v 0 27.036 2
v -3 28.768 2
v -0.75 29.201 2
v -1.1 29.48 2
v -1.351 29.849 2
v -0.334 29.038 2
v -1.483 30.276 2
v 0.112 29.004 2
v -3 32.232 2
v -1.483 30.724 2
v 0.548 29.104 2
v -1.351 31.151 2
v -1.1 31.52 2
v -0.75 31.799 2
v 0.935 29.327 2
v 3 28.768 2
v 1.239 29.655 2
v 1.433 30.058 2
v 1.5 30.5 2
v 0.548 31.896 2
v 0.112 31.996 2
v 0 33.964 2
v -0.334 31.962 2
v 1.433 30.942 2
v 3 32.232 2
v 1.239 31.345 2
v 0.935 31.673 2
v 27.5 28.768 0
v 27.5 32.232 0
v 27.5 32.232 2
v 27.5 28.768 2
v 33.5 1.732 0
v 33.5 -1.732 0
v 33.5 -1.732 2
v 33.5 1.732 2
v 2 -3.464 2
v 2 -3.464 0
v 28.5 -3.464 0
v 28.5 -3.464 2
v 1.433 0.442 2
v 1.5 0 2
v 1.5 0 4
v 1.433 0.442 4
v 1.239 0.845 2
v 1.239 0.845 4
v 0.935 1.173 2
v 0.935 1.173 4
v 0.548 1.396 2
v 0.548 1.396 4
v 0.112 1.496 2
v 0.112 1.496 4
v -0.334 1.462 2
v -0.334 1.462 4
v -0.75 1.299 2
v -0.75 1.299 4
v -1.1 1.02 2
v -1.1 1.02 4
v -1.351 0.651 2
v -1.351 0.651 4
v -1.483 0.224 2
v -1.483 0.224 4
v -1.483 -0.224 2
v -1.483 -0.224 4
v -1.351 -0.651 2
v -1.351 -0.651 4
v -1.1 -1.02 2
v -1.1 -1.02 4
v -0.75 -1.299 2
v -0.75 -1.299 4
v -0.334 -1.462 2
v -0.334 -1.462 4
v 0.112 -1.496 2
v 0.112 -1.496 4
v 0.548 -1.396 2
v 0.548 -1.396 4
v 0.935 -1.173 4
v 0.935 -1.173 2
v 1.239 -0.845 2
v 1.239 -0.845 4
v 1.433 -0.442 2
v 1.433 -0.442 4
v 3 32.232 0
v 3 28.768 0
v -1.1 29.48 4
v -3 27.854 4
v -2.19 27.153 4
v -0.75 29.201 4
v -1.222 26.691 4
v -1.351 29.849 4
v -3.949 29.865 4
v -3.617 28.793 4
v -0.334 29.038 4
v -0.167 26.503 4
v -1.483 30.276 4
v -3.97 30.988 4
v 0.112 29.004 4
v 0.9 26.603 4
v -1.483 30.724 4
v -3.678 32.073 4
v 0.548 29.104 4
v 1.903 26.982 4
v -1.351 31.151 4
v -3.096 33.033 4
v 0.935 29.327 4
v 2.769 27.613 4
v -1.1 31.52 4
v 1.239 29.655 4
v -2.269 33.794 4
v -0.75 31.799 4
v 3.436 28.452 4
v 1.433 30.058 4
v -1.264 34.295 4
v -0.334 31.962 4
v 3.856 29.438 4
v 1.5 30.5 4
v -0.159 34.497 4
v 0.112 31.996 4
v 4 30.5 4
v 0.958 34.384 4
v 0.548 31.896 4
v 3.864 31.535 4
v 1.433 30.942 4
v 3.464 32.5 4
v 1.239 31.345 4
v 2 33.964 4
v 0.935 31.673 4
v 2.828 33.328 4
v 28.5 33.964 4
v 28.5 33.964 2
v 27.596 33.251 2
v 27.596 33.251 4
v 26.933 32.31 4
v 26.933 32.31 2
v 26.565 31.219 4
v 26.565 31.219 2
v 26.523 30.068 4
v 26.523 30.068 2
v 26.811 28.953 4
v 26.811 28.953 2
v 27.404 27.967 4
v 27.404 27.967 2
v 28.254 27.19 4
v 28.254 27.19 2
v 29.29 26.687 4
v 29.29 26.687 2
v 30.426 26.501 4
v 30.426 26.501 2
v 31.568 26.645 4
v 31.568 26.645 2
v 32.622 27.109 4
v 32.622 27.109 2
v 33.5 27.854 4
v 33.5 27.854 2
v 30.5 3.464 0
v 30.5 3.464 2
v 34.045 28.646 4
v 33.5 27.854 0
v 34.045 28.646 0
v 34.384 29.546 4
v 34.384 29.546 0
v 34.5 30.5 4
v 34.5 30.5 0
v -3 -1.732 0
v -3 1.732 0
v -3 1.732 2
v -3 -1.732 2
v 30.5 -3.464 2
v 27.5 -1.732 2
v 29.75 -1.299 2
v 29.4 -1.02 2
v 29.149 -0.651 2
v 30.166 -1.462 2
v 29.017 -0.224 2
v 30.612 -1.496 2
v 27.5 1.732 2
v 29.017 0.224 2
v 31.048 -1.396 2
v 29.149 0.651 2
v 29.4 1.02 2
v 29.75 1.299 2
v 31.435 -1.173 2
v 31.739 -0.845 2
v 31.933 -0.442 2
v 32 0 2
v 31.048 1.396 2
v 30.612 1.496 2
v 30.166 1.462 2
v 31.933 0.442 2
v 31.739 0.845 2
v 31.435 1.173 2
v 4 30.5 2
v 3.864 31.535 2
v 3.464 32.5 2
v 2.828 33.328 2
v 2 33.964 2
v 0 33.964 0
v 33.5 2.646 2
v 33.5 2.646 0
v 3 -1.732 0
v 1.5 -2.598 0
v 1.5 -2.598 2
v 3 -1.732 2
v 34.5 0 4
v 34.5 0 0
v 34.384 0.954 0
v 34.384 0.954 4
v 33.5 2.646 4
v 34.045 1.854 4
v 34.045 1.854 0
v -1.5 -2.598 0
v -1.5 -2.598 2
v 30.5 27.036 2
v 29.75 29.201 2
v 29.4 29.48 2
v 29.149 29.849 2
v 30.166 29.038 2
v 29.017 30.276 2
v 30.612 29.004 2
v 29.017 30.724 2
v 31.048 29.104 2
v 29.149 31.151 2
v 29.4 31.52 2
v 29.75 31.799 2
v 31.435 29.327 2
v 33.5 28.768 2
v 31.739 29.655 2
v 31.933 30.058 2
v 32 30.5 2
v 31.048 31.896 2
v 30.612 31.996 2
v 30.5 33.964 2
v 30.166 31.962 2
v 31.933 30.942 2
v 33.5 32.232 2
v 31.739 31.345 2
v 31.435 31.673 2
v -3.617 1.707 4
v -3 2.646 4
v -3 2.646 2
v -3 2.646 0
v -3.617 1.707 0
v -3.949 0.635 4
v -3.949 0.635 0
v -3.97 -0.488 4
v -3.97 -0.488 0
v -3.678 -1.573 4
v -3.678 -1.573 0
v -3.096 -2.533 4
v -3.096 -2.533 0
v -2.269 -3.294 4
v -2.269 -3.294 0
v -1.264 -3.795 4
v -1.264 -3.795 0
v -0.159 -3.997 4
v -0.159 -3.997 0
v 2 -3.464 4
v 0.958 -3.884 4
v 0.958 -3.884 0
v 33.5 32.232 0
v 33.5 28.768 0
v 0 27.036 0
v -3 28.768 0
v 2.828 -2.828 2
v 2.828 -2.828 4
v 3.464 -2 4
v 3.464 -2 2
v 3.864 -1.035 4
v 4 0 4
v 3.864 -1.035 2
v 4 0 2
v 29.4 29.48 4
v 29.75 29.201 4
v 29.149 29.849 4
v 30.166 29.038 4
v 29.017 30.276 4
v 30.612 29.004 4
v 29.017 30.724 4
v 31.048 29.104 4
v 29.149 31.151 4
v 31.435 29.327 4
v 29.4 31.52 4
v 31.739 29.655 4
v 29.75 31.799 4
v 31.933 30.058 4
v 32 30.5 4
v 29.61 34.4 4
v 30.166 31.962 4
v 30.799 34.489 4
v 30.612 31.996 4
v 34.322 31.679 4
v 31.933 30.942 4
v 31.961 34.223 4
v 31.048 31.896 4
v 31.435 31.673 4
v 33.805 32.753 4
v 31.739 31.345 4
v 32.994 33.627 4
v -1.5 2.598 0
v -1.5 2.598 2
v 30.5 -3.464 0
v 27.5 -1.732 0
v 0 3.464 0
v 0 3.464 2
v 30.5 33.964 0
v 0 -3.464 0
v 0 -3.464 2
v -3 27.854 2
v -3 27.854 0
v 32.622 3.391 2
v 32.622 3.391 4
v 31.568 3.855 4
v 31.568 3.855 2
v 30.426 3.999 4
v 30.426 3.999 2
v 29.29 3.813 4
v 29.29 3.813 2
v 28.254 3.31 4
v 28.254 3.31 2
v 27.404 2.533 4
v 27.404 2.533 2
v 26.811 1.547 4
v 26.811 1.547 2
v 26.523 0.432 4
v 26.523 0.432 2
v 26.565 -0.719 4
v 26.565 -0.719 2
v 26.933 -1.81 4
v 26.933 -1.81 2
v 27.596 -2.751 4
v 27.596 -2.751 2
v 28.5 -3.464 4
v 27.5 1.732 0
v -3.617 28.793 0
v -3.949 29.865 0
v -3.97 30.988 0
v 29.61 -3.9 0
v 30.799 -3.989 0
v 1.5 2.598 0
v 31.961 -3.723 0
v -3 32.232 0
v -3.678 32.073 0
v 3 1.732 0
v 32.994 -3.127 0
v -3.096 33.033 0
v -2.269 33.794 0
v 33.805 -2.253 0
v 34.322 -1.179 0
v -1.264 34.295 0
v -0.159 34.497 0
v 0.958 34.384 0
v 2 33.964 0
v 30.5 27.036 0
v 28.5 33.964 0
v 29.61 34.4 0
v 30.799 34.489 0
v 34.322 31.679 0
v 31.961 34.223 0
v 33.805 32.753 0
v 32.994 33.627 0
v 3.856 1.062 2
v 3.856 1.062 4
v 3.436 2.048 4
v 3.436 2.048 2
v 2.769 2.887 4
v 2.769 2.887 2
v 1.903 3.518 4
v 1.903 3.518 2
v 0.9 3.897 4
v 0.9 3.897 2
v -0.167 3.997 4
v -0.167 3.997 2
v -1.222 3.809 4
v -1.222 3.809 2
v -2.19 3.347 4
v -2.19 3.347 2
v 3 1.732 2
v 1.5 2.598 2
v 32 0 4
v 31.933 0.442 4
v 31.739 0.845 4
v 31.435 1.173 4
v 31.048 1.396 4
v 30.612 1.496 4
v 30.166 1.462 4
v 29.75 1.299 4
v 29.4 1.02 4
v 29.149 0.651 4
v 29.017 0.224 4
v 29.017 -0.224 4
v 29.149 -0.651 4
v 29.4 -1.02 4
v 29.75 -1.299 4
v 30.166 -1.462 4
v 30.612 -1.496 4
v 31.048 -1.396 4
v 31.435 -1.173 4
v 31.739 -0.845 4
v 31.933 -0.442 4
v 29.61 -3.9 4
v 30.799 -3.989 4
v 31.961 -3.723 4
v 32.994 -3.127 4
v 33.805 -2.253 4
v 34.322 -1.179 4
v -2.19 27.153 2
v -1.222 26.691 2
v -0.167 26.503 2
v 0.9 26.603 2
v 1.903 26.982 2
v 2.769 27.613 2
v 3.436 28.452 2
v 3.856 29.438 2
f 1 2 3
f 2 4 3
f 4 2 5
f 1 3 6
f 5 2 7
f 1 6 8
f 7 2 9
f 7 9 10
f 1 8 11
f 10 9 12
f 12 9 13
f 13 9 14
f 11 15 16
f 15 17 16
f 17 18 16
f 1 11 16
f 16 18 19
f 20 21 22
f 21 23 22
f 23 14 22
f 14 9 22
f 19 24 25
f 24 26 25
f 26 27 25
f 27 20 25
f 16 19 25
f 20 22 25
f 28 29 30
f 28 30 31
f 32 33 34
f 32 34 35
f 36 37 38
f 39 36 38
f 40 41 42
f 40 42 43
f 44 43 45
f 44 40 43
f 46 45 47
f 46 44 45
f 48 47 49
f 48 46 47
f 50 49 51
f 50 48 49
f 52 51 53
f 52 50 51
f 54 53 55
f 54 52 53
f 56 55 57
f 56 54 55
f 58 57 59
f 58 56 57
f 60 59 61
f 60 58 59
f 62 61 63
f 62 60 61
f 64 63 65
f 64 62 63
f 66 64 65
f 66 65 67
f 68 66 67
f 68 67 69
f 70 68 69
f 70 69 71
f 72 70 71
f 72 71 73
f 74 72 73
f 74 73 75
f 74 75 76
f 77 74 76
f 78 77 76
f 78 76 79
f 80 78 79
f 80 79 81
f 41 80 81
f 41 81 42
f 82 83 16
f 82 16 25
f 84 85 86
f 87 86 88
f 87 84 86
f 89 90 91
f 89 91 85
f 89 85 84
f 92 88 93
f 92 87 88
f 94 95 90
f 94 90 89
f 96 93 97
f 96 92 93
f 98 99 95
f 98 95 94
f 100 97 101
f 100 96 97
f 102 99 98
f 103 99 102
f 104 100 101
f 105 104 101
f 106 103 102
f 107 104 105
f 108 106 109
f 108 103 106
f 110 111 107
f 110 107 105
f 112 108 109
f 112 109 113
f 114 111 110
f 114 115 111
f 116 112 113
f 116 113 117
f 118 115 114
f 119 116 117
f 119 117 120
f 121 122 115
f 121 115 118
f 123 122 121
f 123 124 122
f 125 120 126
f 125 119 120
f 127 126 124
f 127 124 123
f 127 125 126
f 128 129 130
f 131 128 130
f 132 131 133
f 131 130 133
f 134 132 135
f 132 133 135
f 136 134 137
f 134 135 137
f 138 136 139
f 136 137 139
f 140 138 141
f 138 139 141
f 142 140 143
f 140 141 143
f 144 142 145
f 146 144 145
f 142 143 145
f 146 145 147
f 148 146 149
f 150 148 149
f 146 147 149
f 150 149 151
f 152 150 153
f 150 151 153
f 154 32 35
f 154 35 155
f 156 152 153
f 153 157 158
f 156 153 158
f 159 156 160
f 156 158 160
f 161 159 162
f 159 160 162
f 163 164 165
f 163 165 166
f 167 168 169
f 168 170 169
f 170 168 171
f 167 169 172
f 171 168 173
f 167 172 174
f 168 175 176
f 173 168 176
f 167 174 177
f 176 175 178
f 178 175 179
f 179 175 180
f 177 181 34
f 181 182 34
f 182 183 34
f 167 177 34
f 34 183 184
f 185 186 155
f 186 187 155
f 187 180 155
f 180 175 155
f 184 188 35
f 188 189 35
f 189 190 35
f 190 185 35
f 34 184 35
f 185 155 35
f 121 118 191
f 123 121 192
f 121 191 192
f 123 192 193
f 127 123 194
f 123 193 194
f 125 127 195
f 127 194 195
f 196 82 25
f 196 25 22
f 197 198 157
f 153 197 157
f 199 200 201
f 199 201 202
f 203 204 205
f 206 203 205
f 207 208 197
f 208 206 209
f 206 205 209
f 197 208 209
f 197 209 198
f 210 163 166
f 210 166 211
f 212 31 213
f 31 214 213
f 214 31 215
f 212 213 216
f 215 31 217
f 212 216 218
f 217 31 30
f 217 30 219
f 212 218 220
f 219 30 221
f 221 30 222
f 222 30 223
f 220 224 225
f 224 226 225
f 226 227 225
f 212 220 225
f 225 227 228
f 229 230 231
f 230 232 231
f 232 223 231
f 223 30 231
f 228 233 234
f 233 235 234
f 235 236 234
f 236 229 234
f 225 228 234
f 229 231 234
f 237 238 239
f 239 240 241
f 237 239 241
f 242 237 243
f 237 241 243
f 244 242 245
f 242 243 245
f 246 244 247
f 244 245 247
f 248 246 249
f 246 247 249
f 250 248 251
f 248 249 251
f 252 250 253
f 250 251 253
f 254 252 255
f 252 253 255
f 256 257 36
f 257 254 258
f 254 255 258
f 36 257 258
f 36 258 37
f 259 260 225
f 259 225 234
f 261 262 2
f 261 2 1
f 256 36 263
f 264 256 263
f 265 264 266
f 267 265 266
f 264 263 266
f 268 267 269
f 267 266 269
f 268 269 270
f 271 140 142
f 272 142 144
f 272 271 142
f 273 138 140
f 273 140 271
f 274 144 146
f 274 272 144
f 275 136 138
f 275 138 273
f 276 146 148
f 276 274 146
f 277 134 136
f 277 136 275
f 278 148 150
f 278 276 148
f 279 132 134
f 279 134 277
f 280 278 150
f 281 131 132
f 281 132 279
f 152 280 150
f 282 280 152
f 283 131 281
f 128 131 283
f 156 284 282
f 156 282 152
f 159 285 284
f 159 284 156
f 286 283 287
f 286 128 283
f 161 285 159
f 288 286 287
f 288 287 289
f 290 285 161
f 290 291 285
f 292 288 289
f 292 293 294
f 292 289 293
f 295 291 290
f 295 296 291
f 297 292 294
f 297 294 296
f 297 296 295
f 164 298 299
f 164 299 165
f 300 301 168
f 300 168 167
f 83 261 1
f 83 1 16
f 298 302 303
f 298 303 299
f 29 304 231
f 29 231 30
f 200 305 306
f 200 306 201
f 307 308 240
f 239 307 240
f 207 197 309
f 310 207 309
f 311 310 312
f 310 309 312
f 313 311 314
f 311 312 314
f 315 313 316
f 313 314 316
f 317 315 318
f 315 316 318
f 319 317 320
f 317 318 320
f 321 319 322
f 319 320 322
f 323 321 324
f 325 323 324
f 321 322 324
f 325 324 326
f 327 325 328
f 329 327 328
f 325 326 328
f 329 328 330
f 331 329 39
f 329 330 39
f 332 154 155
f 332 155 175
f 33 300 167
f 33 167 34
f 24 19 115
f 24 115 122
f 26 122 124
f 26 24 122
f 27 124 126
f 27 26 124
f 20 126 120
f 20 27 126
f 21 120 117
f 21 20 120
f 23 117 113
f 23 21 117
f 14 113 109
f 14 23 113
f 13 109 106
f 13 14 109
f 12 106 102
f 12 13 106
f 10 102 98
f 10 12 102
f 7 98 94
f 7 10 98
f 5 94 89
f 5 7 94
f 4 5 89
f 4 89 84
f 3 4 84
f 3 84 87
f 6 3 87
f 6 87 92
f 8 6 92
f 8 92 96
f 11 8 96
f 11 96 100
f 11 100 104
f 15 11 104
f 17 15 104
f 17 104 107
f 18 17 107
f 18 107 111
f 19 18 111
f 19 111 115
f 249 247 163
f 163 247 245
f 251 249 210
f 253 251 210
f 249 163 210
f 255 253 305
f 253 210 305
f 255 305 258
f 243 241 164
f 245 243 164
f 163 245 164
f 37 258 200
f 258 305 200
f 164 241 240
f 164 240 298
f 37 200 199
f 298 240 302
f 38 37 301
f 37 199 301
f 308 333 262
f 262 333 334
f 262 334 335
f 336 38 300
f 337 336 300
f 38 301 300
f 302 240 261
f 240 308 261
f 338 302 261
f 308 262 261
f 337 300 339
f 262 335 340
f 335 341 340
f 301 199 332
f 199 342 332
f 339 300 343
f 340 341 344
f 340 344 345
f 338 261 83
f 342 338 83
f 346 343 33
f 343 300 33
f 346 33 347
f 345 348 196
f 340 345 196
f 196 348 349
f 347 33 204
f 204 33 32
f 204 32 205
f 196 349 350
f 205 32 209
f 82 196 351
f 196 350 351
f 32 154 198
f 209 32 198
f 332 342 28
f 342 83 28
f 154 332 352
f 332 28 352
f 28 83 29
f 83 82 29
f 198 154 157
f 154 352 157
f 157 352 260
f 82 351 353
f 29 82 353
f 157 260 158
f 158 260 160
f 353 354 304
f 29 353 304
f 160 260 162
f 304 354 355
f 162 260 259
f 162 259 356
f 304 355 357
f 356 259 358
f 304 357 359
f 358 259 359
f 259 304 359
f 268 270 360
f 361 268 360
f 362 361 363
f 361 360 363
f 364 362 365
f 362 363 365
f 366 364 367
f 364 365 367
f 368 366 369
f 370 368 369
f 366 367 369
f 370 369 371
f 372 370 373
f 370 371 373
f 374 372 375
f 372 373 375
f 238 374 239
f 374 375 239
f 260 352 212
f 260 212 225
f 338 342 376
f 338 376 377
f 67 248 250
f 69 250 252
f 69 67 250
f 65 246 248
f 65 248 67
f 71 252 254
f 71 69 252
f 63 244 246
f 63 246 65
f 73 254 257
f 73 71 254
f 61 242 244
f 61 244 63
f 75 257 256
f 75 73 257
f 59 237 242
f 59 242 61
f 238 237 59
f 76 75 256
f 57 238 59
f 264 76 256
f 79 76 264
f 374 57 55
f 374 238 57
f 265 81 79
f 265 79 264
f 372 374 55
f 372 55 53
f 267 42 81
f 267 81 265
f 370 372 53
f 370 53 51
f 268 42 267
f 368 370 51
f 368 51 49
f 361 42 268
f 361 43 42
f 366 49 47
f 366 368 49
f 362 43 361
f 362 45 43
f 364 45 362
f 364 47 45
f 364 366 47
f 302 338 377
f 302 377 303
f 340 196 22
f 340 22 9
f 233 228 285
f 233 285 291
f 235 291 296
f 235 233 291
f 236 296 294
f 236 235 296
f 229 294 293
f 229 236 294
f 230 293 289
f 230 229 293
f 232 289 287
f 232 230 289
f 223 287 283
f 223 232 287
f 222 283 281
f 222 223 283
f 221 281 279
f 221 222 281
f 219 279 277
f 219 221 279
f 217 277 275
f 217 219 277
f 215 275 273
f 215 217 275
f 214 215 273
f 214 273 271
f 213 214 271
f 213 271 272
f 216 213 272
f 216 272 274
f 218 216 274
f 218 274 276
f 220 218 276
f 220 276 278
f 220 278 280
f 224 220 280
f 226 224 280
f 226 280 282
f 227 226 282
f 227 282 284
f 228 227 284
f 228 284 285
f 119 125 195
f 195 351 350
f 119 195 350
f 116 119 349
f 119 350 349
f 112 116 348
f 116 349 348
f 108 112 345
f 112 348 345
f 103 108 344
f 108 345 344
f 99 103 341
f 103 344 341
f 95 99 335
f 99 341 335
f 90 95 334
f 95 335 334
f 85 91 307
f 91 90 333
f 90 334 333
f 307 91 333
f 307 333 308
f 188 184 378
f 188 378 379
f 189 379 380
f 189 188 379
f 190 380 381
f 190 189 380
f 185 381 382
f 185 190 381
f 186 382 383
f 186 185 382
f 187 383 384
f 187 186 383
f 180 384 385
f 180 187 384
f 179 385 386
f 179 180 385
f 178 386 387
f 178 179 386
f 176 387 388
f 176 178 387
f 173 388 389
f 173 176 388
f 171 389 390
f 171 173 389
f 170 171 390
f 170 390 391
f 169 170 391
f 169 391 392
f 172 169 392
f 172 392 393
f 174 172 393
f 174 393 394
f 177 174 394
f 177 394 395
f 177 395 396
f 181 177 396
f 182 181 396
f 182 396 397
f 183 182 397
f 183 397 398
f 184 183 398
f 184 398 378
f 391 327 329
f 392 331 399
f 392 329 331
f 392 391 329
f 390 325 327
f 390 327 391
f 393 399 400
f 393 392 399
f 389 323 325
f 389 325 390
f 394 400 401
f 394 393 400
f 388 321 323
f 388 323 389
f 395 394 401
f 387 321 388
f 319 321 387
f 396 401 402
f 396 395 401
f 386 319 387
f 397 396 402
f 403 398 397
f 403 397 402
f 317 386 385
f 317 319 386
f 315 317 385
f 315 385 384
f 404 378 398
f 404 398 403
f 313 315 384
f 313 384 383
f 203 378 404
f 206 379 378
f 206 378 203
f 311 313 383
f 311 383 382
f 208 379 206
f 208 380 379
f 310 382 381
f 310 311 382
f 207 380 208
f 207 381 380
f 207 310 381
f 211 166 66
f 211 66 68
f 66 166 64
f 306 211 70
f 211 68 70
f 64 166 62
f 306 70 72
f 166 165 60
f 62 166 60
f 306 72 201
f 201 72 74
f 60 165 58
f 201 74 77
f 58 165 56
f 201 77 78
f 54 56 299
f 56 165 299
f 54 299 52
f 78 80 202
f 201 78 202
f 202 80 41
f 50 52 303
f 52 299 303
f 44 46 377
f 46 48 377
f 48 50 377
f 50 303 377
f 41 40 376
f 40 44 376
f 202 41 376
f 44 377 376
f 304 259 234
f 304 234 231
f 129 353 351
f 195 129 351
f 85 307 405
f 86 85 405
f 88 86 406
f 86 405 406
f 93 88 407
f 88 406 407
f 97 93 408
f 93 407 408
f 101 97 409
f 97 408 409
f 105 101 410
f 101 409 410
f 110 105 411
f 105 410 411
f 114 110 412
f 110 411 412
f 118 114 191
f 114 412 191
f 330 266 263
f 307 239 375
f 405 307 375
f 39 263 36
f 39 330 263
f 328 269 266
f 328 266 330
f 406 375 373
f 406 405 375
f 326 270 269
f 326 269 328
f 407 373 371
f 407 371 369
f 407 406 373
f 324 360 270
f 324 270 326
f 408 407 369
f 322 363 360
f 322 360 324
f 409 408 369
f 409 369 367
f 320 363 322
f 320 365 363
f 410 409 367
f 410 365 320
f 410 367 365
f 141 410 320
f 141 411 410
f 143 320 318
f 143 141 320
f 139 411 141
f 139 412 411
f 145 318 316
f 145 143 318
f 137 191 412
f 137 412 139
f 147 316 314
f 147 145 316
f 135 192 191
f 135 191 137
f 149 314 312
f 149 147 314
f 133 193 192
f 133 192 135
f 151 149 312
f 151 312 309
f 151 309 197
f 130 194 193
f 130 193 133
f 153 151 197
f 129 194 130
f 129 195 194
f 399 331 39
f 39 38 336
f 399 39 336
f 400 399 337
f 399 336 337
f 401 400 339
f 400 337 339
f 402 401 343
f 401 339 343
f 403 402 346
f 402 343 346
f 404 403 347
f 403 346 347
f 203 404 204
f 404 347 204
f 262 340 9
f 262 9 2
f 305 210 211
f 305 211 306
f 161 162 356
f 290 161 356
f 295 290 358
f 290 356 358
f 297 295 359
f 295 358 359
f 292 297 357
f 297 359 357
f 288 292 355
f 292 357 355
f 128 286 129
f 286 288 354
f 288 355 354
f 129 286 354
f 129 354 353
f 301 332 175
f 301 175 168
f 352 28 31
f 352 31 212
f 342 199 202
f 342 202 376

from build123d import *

# Parameters (mm, degrees)
F1_DEPTH = 2
F2_DEPTH = 4
F0_R     = 1.5
F3_DEPTH = 4
F4_DEPTH = 2


with BuildPart() as f1:
    # F0 (on Top) → F1 (new body)
    with BuildSketch(Plane.XY):
        with BuildLine():
            ThreePointArc((-3, 2.6457513111), (1.4142135624, 3.7416573868), (4, 0))
            ThreePointArc((4, 0), (3.4641016151, -2), (2, -3.4641016151))
            Line((2, -3.4641016151), (28.5, -3.4641016151))
            ThreePointArc((28.5, -3.4641016151), (27.4044264352, 2.533263568), (33.5, 2.6457513111))
            Line((33.5, 2.6457513111), (33.5, 27.8542486889))
            ThreePointArc((33.5, 27.8542486889), (27.4044264352, 27.966736432), (28.5, 33.9641016151))
            Line((28.5, 33.9641016151), (2, 33.9641016151))
            ThreePointArc((2, 33.9641016151), (3.4641016151, 32.5), (4, 30.5))
            ThreePointArc((4, 30.5), (1.4142135624, 26.7583426132), (-3, 27.8542486889))
            Line((-3, 27.8542486889), (-3, 2.6457513111))
        make_face()
    extrude(amount=F1_DEPTH)

    # F0 (on Top) → F2 (join)
    with BuildSketch(Plane.XY):
        with BuildLine():
            Line((-3, 28.7679491924), (-3, 27.8542486889))
            ThreePointArc((-3, 27.8542486889), (1.4142135624, 26.7583426132), (4, 30.5))
            ThreePointArc((4, 30.5), (3.4641016151, 32.5), (2, 33.9641016151))
            Line((2, 33.9641016151), (0, 33.9641016151))
            Line((0, 33.9641016151), (3, 32.2320508076))
            Line((3, 32.2320508076), (3, 28.7679491924))
            Line((3, 28.7679491924), (0, 27.0358983849))
            Line((0, 27.0358983849), (-3, 28.7679491924))
        make_face()
        with BuildLine():
            ThreePointArc((2, 33.9641016151), (-3.0955735648, 33.033263568), (-3, 27.8542486889))
            Line((-3, 27.8542486889), (-3, 28.7679491924))
            Line((-3, 28.7679491924), (-3, 32.2320508076))
            Line((-3, 32.2320508076), (0, 33.9641016151))
            Line((0, 33.9641016151), (2, 33.9641016151))
        make_face()
        with BuildLine():
            ThreePointArc((2, -3.4641016151), (3.4641016151, -2), (4, 0))
            ThreePointArc((4, 0), (1.4142135624, 3.7416573868), (-3, 2.6457513111))
            Line((-3, 2.6457513111), (-3, 1.7320508076))
            Line((-3, 1.7320508076), (-1.4999999564, 2.5980762365))
            Line((-1.4999999564, 2.5980762365), (0, 3.4641016151))
            Line((0, 3.4641016151), (1.4999999564, 2.5980762365))
            Line((1.4999999564, 2.5980762365), (3, 1.7320508076))
            Line((3, 1.7320508076), (3, 0))
            Line((3, 0), (3, -1.7320508076))
            Line((3, -1.7320508076), (1.4999999564, -2.5980762365))
            Line((1.4999999564, -2.5980762365), (0, -3.4641016151))
            Line((0, -3.4641016151), (2, -3.4641016151))
        make_face()
        with BuildLine():
            Line((-3, 1.7320508076), (-3, 2.6457513111))
            ThreePointArc((-3, 2.6457513111), (-3.0955735648, -2.533263568), (2, -3.4641016151))
            Line((2, -3.4641016151), (0, -3.4641016151))
            Line((0, -3.4641016151), (-1.4999999973, -2.5980762129))
            Line((-1.4999999973, -2.5980762129), (-3, -1.7320508076))
            Line((-3, -1.7320508076), (-3, 0))
            Line((-3, 0), (-3, 1.7320508076))
        make_face()
        with BuildLine():
            Line((30.5, 33.9641016151), (28.5, 33.9641016151))
            ThreePointArc((28.5, 33.9641016151), (27.4044264352, 27.966736432), (33.5, 27.8542486889))
            Line((33.5, 27.8542486889), (33.5, 28.7679491924))
            Line((33.5, 28.7679491924), (30.5, 27.0358983849))
            Line((30.5, 27.0358983849), (27.5, 28.7679491924))
            Line((27.5, 28.7679491924), (27.5, 32.2320508076))
            Line((27.5, 32.2320508076), (30.5, 33.9641016151))
        make_face()
        with BuildLine():
            ThreePointArc((34.5, 30.5), (32.5, 33.9641016151), (28.5, 33.9641016151))
            Line((28.5, 33.9641016151), (30.5, 33.9641016151))
            Line((30.5, 33.9641016151), (33.5, 32.2320508076))
            Line((33.5, 32.2320508076), (33.5, 28.7679491924))
            Line((33.5, 28.7679491924), (33.5, 27.8542486889))
            ThreePointArc((33.5, 27.8542486889), (34.2416573868, 29.0857864376), (34.5, 30.5))
        make_face()
        with BuildLine():
            Line((30.5, -3.4641016151), (28.5, -3.4641016151))
            ThreePointArc((28.5, -3.4641016151), (32.5, -3.4641016151), (34.5, 0))
            ThreePointArc((34.5, 0), (34.2416573868, 1.4142135624), (33.5, 2.6457513111))
            Line((33.5, 2.6457513111), (33.5, 1.7320508076))
            Line((33.5, 1.7320508076), (33.5, -1.7320508076))
            Line((33.5, -1.7320508076), (30.5, -3.4641016151))
        make_face()
        with BuildLine():
            ThreePointArc((33.5, 2.6457513111), (27.4044264352, 2.533263568), (28.5, -3.4641016151))
            Line((28.5, -3.4641016151), (30.5, -3.4641016151))
            Line((30.5, -3.4641016151), (27.5, -1.7320508076))
            Line((27.5, -1.7320508076), (27.5, 1.7320508076))
            Line((27.5, 1.7320508076), (30.5, 3.4641016151))
            Line((30.5, 3.4641016151), (33.5, 1.7320508076))
            Line((33.5, 1.7320508076), (33.5, 2.6457513111))
        make_face()
    extrude(amount=F2_DEPTH)

    # F0 (on Top) → F3 (join)
    with BuildSketch(Plane.XY):
        with BuildLine():
            ThreePointArc((-1.4999999564, 2.5980762365), (-2.5980761988, 1.5000000218), (-3, 0))
            ThreePointArc((-3, 0), (-2.5980762106, -1.5000000014), (-1.4999999973, -2.5980762129))
            ThreePointArc((-1.4999999973, -2.5980762129), (-2.36e-08, -3), (1.4999999564, -2.5980762365))
            ThreePointArc((1.4999999564, -2.5980762365), (2.5980761988, -1.5000000218), (3, 0))
            ThreePointArc((3, 0), (2.5980761988, 1.5000000218), (1.4999999564, 2.5980762365))
            ThreePointArc((1.4999999564, 2.5980762365), (0, 3), (-1.4999999564, 2.5980762365))
        make_face()
        Circle(F0_R, mode=Mode.SUBTRACT)
        with BuildLine():
            ThreePointArc((2, -3.4641016151), (3.4641016151, -2), (4, 0))
            ThreePointArc((4, 0), (1.4142135624, 3.7416573868), (-3, 2.6457513111))
            Line((-3, 2.6457513111), (-3, 1.7320508076))
            Line((-3, 1.7320508076), (-1.4999999564, 2.5980762365))
            Line((-1.4999999564, 2.5980762365), (0, 3.4641016151))
            Line((0, 3.4641016151), (1.4999999564, 2.5980762365))
            Line((1.4999999564, 2.5980762365), (3, 1.7320508076))
            Line((3, 1.7320508076), (3, 0))
            Line((3, 0), (3, -1.7320508076))
            Line((3, -1.7320508076), (1.4999999564, -2.5980762365))
            Line((1.4999999564, -2.5980762365), (0, -3.4641016151))
            Line((0, -3.4641016151), (2, -3.4641016151))
        make_face()
        with BuildLine():
            Line((-1.4999999564, 2.5980762365), (-3, 1.7320508076))
            Line((-3, 1.7320508076), (-3, 0))
            ThreePointArc((-3, 0), (-2.5980761988, 1.5000000218), (-1.4999999564, 2.5980762365))
        make_face()
        with BuildLine():
            Line((0, 3.4641016151), (-1.4999999564, 2.5980762365))
            ThreePointArc((-1.4999999564, 2.5980762365), (0, 3), (1.4999999564, 2.5980762365))
            Line((1.4999999564, 2.5980762365), (0, 3.4641016151))
        make_face()
        with BuildLine():
            Line((3, 1.7320508076), (1.4999999564, 2.5980762365))
            ThreePointArc((1.4999999564, 2.5980762365), (2.5980761988, 1.5000000218), (3, 0))
            Line((3, 0), (3, 1.7320508076))
        make_face()
        with BuildLine():
            ThreePointArc((3, 0), (2.5980761988, -1.5000000218), (1.4999999564, -2.5980762365))
            Line((1.4999999564, -2.5980762365), (3, -1.7320508076))
            Line((3, -1.7320508076), (3, 0))
        make_face()
        with BuildLine():
            ThreePointArc((-1.4999999973, -2.5980762129), (-2.5980762106, -1.5000000014), (-3, 0))
            Line((-3, 0), (-3, -1.7320508076))
            Line((-3, -1.7320508076), (-1.4999999973, -2.5980762129))
        make_face()
        with BuildLine():
            Line((-3, 1.7320508076), (-3, 2.6457513111))
            ThreePointArc((-3, 2.6457513111), (-3.0955735648, -2.533263568), (2, -3.4641016151))
            Line((2, -3.4641016151), (0, -3.4641016151))
            Line((0, -3.4641016151), (-1.4999999973, -2.5980762129))
            Line((-1.4999999973, -2.5980762129), (-3, -1.7320508076))
            Line((-3, -1.7320508076), (-3, 0))
            Line((-3, 0), (-3, 1.7320508076))
        make_face()
        with BuildLine():
            Line((-1.4999999973, -2.5980762129), (0, -3.4641016151))
            Line((0, -3.4641016151), (1.4999999564, -2.5980762365))
            ThreePointArc((1.4999999564, -2.5980762365), (-2.36e-08, -3), (-1.4999999973, -2.5980762129))
        make_face()
        Polygon((27.5, -1.7320508076), (30.5, -3.4641016151), (33.5, -1.7320508076), (33.5, 1.7320508076), (30.5, 3.4641016151), (27.5, 1.7320508076), align=None)
        with Locations((30.5, 0)):
            Circle(F0_R, mode=Mode.SUBTRACT)
        with BuildLine():
            ThreePointArc((33.5, 2.6457513111), (27.4044264352, 2.533263568), (28.5, -3.4641016151))
            Line((28.5, -3.4641016151), (30.5, -3.4641016151))
            Line((30.5, -3.4641016151), (27.5, -1.7320508076))
            Line((27.5, -1.7320508076), (27.5, 1.7320508076))
            Line((27.5, 1.7320508076), (30.5, 3.4641016151))
            Line((30.5, 3.4641016151), (33.5, 1.7320508076))
            Line((33.5, 1.7320508076), (33.5, 2.6457513111))
        make_face()
        with BuildLine():
            Line((30.5, -3.4641016151), (28.5, -3.4641016151))
            ThreePointArc((28.5, -3.4641016151), (32.5, -3.4641016151), (34.5, 0))
            ThreePointArc((34.5, 0), (34.2416573868, 1.4142135624), (33.5, 2.6457513111))
            Line((33.5, 2.6457513111), (33.5, 1.7320508076))
            Line((33.5, 1.7320508076), (33.5, -1.7320508076))
            Line((33.5, -1.7320508076), (30.5, -3.4641016151))
        make_face()
        with BuildLine():
            ThreePointArc((34.5, 30.5), (32.5, 33.9641016151), (28.5, 33.9641016151))
            Line((28.5, 33.9641016151), (30.5, 33.9641016151))
            Line((30.5, 33.9641016151), (33.5, 32.2320508076))
            Line((33.5, 32.2320508076), (33.5, 28.7679491924))
            Line((33.5, 28.7679491924), (33.5, 27.8542486889))
            ThreePointArc((33.5, 27.8542486889), (34.2416573868, 29.0857864376), (34.5, 30.5))
        make_face()
        Polygon((33.5, 32.2320508076), (30.5, 33.9641016151), (27.5, 32.2320508076), (27.5, 28.7679491924), (30.5, 27.0358983849), (33.5, 28.7679491924), align=None)
        with Locations((30.5, 30.5)):
            Circle(F0_R, mode=Mode.SUBTRACT)
        with BuildLine():
            Line((30.5, 33.9641016151), (28.5, 33.9641016151))
            ThreePointArc((28.5, 33.9641016151), (27.4044264352, 27.966736432), (33.5, 27.8542486889))
            Line((33.5, 27.8542486889), (33.5, 28.7679491924))
            Line((33.5, 28.7679491924), (30.5, 27.0358983849))
            Line((30.5, 27.0358983849), (27.5, 28.7679491924))
            Line((27.5, 28.7679491924), (27.5, 32.2320508076))
            Line((27.5, 32.2320508076), (30.5, 33.9641016151))
        make_face()
        with BuildLine():
            ThreePointArc((2, 33.9641016151), (-3.0955735648, 33.033263568), (-3, 27.8542486889))
            Line((-3, 27.8542486889), (-3, 28.7679491924))
            Line((-3, 28.7679491924), (-3, 32.2320508076))
            Line((-3, 32.2320508076), (0, 33.9641016151))
            Line((0, 33.9641016151), (2, 33.9641016151))
        make_face()
        Polygon((-3, 32.2320508076), (-3, 28.7679491924), (0, 27.0358983849), (3, 28.7679491924), (3, 32.2320508076), (0, 33.9641016151), align=None)
        with Locations((0, 30.5)):
            Circle(F0_R, mode=Mode.SUBTRACT)
        with BuildLine():
            Line((-3, 28.7679491924), (-3, 27.8542486889))
            ThreePointArc((-3, 27.8542486889), (1.4142135624, 26.7583426132), (4, 30.5))
            ThreePointArc((4, 30.5), (3.4641016151, 32.5), (2, 33.9641016151))
            Line((2, 33.9641016151), (0, 33.9641016151))
            Line((0, 33.9641016151), (3, 32.2320508076))
            Line((3, 32.2320508076), (3, 28.7679491924))
            Line((3, 28.7679491924), (0, 27.0358983849))
            Line((0, 27.0358983849), (-3, 28.7679491924))
        make_face()
    extrude(amount=F3_DEPTH)

    # F0 (on Top) → F4 (cut)
    with BuildSketch(Plane.XY):
        Polygon((-3, 32.2320508076), (-3, 28.7679491924), (0, 27.0358983849), (3, 28.7679491924), (3, 32.2320508076), (0, 33.9641016151), align=None)
        with Locations((0, 30.5)):
            Circle(F0_R, mode=Mode.SUBTRACT)
        Polygon((33.5, 32.2320508076), (30.5, 33.9641016151), (27.5, 32.2320508076), (27.5, 28.7679491924), (30.5, 27.0358983849), (33.5, 28.7679491924), align=None)
        with Locations((30.5, 30.5)):
            Circle(F0_R, mode=Mode.SUBTRACT)
        Polygon((27.5, -1.7320508076), (30.5, -3.4641016151), (33.5, -1.7320508076), (33.5, 1.7320508076), (30.5, 3.4641016151), (27.5, 1.7320508076), align=None)
        with Locations((30.5, 0)):
            Circle(F0_R, mode=Mode.SUBTRACT)
        with BuildLine():
            ThreePointArc((-1.4999999564, 2.5980762365), (-2.5980761988, 1.5000000218), (-3, 0))
            ThreePointArc((-3, 0), (-2.5980762106, -1.5000000014), (-1.4999999973, -2.5980762129))
            ThreePointArc((-1.4999999973, -2.5980762129), (-2.36e-08, -3), (1.4999999564, -2.5980762365))
            ThreePointArc((1.4999999564, -2.5980762365), (2.5980761988, -1.5000000218), (3, 0))
            ThreePointArc((3, 0), (2.5980761988, 1.5000000218), (1.4999999564, 2.5980762365))
            ThreePointArc((1.4999999564, 2.5980762365), (0, 3), (-1.4999999564, 2.5980762365))
        make_face()
        Circle(F0_R, mode=Mode.SUBTRACT)
        with BuildLine():
            Line((-1.4999999564, 2.5980762365), (-3, 1.7320508076))
            Line((-3, 1.7320508076), (-3, 0))
            ThreePointArc((-3, 0), (-2.5980761988, 1.5000000218), (-1.4999999564, 2.5980762365))
        make_face()
        with BuildLine():
            ThreePointArc((-1.4999999973, -2.5980762129), (-2.5980762106, -1.5000000014), (-3, 0))
            Line((-3, 0), (-3, -1.7320508076))
            Line((-3, -1.7320508076), (-1.4999999973, -2.5980762129))
        make_face()
        with BuildLine():
            ThreePointArc((3, 0), (2.5980761988, -1.5000000218), (1.4999999564, -2.5980762365))
            Line((1.4999999564, -2.5980762365), (3, -1.7320508076))
            Line((3, -1.7320508076), (3, 0))
        make_face()
        with BuildLine():
            Line((3, 1.7320508076), (1.4999999564, 2.5980762365))
            ThreePointArc((1.4999999564, 2.5980762365), (2.5980761988, 1.5000000218), (3, 0))
            Line((3, 0), (3, 1.7320508076))
        make_face()
        with BuildLine():
            Line((0, 3.4641016151), (-1.4999999564, 2.5980762365))
            ThreePointArc((-1.4999999564, 2.5980762365), (0, 3), (1.4999999564, 2.5980762365))
            Line((1.4999999564, 2.5980762365), (0, 3.4641016151))
        make_face()
        with BuildLine():
            Line((-1.4999999973, -2.5980762129), (0, -3.4641016151))
            Line((0, -3.4641016151), (1.4999999564, -2.5980762365))
            ThreePointArc((1.4999999564, -2.5980762365), (-2.36e-08, -3), (-1.4999999973, -2.5980762129))
        make_face()
    extrude(amount=F4_DEPTH, mode=Mode.SUBTRACT)


solid = f1.part
